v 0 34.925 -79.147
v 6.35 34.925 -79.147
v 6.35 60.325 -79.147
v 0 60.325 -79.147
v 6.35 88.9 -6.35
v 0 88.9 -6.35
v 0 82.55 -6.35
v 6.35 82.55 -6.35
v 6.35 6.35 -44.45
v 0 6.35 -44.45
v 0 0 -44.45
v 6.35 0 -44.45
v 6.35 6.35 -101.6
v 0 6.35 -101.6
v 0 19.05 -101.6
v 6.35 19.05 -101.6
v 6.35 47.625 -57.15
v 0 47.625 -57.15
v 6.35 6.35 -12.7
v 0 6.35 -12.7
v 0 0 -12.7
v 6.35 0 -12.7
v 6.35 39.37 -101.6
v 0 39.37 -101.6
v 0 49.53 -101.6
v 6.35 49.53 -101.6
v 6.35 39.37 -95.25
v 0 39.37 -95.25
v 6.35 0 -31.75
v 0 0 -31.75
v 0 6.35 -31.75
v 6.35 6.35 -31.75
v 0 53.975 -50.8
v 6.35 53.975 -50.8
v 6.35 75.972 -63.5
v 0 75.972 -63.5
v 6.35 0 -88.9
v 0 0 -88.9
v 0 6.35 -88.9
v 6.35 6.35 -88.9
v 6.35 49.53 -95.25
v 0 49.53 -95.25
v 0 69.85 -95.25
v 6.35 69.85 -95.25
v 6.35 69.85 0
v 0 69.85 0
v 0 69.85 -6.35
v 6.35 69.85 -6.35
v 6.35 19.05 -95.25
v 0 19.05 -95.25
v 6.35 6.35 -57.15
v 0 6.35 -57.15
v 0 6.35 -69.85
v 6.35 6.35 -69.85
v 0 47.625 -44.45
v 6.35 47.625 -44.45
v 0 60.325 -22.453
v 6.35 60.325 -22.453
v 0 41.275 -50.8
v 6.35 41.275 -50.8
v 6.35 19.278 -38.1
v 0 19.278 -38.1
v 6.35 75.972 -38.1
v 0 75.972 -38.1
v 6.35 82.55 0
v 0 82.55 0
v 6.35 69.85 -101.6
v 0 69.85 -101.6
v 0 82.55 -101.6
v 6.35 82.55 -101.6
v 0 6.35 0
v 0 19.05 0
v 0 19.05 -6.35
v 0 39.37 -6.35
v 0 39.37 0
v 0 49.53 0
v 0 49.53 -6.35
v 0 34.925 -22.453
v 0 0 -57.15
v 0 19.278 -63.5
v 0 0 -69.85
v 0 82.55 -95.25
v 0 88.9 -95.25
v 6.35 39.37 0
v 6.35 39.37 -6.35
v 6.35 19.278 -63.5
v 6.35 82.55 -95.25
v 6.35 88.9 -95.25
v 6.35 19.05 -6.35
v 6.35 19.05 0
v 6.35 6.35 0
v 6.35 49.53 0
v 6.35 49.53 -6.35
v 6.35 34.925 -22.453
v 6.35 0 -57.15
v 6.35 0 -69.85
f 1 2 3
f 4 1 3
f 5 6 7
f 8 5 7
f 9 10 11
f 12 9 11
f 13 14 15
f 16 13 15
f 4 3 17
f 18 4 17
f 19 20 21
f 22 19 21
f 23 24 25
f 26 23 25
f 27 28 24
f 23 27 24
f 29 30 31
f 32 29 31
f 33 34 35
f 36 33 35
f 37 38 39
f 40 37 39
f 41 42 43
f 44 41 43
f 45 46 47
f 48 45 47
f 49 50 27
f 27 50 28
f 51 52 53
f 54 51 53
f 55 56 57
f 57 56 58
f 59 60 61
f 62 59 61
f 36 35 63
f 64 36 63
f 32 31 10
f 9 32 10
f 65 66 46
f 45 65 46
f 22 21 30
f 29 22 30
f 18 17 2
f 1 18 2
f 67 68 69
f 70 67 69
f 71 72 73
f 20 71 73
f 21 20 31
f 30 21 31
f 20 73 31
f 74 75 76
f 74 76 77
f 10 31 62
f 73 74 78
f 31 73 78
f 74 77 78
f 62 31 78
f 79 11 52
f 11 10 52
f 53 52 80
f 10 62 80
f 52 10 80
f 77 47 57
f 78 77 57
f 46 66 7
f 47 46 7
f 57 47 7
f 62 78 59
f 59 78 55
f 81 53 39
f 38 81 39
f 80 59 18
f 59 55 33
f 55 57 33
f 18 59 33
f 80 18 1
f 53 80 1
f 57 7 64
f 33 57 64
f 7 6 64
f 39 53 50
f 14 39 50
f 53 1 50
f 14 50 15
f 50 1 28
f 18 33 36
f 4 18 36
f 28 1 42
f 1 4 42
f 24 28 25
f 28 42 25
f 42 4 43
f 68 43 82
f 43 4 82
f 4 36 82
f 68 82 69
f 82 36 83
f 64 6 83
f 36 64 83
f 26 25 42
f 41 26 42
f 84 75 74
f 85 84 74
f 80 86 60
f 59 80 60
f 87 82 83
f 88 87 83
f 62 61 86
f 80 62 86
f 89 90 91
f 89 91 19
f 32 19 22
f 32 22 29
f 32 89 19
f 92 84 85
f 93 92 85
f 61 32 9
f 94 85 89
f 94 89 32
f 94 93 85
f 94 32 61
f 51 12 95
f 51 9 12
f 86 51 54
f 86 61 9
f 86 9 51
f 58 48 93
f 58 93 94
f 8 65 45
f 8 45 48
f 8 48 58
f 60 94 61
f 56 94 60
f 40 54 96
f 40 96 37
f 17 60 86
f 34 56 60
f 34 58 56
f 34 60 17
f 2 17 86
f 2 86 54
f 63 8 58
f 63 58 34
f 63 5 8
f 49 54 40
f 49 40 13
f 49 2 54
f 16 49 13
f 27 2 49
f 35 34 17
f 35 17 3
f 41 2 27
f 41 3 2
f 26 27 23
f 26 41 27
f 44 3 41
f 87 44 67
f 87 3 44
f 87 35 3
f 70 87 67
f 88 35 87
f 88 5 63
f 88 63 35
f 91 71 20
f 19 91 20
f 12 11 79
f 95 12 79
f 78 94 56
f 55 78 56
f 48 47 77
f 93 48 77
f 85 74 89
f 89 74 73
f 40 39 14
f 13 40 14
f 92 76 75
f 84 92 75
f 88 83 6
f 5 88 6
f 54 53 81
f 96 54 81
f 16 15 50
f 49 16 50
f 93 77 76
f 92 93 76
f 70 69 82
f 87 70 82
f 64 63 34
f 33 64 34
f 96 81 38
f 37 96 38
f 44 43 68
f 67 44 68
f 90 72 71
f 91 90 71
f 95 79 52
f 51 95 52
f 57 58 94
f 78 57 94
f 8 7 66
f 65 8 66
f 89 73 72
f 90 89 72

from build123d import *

# Parameters (mm, degrees)
BOSS_EXTRUDE1_DEPTH = 6.35
CUT_EXTRUDE1_DEPTH  = 6.35


with BuildPart() as part:
    # Sketch1 → Boss-Extrude1 (new body)
    with BuildSketch(Plane(origin=(0, 0, 0), x_dir=(0, 0, -1), z_dir=(1, 0, 0))):
        Polygon((44.45, 0), (57.15, 0), (57.15, 6.35), (69.85, 6.35), (69.85, 0), (88.9, 0), (88.9, 6.35), (101.6, 6.35), (101.6, 19.05), (95.25, 19.05), (95.25, 39.37), (101.6, 39.37), (101.6, 49.53), (95.25, 49.53), (95.25, 69.85), (101.6, 69.85), (101.6, 82.55), (95.25, 82.55), (95.25, 88.9), (6.35, 88.9), (6.35, 82.55), (0, 82.55), (0, 69.85), (6.35, 69.85), (6.35, 49.53), (0, 49.53), (0, 39.37), (6.35, 39.37), (6.35, 19.05), (0, 19.05), (0, 6.35), (12.7, 6.35), (12.7, 0), (31.75, 0), (31.75, 6.35), (44.45, 6.35), align=None)
    extrude(amount=BOSS_EXTRUDE1_DEPTH)

    # Sketch2 → Cut-Extrude1 (cut)
    with BuildSketch(Plane(origin=(6.35, 0, 0), x_dir=(0, 0, -1), z_dir=(1, 0, 0))):
        Polygon((44.45, 47.625), (22.452954744, 60.325), (22.452954744, 34.925), align=None)
        Polygon((50.8, 53.975), (63.5, 75.972045256), (38.1, 75.972045256), align=None)
        Polygon((57.15, 47.625), (79.147045256, 34.925), (79.147045256, 60.325), align=None)
        Polygon((50.8, 41.275), (38.1, 19.277954744), (63.5, 19.277954744), align=None)
    extrude(amount=-CUT_EXTRUDE1_DEPTH, mode=Mode.SUBTRACT)


solid = part.part
